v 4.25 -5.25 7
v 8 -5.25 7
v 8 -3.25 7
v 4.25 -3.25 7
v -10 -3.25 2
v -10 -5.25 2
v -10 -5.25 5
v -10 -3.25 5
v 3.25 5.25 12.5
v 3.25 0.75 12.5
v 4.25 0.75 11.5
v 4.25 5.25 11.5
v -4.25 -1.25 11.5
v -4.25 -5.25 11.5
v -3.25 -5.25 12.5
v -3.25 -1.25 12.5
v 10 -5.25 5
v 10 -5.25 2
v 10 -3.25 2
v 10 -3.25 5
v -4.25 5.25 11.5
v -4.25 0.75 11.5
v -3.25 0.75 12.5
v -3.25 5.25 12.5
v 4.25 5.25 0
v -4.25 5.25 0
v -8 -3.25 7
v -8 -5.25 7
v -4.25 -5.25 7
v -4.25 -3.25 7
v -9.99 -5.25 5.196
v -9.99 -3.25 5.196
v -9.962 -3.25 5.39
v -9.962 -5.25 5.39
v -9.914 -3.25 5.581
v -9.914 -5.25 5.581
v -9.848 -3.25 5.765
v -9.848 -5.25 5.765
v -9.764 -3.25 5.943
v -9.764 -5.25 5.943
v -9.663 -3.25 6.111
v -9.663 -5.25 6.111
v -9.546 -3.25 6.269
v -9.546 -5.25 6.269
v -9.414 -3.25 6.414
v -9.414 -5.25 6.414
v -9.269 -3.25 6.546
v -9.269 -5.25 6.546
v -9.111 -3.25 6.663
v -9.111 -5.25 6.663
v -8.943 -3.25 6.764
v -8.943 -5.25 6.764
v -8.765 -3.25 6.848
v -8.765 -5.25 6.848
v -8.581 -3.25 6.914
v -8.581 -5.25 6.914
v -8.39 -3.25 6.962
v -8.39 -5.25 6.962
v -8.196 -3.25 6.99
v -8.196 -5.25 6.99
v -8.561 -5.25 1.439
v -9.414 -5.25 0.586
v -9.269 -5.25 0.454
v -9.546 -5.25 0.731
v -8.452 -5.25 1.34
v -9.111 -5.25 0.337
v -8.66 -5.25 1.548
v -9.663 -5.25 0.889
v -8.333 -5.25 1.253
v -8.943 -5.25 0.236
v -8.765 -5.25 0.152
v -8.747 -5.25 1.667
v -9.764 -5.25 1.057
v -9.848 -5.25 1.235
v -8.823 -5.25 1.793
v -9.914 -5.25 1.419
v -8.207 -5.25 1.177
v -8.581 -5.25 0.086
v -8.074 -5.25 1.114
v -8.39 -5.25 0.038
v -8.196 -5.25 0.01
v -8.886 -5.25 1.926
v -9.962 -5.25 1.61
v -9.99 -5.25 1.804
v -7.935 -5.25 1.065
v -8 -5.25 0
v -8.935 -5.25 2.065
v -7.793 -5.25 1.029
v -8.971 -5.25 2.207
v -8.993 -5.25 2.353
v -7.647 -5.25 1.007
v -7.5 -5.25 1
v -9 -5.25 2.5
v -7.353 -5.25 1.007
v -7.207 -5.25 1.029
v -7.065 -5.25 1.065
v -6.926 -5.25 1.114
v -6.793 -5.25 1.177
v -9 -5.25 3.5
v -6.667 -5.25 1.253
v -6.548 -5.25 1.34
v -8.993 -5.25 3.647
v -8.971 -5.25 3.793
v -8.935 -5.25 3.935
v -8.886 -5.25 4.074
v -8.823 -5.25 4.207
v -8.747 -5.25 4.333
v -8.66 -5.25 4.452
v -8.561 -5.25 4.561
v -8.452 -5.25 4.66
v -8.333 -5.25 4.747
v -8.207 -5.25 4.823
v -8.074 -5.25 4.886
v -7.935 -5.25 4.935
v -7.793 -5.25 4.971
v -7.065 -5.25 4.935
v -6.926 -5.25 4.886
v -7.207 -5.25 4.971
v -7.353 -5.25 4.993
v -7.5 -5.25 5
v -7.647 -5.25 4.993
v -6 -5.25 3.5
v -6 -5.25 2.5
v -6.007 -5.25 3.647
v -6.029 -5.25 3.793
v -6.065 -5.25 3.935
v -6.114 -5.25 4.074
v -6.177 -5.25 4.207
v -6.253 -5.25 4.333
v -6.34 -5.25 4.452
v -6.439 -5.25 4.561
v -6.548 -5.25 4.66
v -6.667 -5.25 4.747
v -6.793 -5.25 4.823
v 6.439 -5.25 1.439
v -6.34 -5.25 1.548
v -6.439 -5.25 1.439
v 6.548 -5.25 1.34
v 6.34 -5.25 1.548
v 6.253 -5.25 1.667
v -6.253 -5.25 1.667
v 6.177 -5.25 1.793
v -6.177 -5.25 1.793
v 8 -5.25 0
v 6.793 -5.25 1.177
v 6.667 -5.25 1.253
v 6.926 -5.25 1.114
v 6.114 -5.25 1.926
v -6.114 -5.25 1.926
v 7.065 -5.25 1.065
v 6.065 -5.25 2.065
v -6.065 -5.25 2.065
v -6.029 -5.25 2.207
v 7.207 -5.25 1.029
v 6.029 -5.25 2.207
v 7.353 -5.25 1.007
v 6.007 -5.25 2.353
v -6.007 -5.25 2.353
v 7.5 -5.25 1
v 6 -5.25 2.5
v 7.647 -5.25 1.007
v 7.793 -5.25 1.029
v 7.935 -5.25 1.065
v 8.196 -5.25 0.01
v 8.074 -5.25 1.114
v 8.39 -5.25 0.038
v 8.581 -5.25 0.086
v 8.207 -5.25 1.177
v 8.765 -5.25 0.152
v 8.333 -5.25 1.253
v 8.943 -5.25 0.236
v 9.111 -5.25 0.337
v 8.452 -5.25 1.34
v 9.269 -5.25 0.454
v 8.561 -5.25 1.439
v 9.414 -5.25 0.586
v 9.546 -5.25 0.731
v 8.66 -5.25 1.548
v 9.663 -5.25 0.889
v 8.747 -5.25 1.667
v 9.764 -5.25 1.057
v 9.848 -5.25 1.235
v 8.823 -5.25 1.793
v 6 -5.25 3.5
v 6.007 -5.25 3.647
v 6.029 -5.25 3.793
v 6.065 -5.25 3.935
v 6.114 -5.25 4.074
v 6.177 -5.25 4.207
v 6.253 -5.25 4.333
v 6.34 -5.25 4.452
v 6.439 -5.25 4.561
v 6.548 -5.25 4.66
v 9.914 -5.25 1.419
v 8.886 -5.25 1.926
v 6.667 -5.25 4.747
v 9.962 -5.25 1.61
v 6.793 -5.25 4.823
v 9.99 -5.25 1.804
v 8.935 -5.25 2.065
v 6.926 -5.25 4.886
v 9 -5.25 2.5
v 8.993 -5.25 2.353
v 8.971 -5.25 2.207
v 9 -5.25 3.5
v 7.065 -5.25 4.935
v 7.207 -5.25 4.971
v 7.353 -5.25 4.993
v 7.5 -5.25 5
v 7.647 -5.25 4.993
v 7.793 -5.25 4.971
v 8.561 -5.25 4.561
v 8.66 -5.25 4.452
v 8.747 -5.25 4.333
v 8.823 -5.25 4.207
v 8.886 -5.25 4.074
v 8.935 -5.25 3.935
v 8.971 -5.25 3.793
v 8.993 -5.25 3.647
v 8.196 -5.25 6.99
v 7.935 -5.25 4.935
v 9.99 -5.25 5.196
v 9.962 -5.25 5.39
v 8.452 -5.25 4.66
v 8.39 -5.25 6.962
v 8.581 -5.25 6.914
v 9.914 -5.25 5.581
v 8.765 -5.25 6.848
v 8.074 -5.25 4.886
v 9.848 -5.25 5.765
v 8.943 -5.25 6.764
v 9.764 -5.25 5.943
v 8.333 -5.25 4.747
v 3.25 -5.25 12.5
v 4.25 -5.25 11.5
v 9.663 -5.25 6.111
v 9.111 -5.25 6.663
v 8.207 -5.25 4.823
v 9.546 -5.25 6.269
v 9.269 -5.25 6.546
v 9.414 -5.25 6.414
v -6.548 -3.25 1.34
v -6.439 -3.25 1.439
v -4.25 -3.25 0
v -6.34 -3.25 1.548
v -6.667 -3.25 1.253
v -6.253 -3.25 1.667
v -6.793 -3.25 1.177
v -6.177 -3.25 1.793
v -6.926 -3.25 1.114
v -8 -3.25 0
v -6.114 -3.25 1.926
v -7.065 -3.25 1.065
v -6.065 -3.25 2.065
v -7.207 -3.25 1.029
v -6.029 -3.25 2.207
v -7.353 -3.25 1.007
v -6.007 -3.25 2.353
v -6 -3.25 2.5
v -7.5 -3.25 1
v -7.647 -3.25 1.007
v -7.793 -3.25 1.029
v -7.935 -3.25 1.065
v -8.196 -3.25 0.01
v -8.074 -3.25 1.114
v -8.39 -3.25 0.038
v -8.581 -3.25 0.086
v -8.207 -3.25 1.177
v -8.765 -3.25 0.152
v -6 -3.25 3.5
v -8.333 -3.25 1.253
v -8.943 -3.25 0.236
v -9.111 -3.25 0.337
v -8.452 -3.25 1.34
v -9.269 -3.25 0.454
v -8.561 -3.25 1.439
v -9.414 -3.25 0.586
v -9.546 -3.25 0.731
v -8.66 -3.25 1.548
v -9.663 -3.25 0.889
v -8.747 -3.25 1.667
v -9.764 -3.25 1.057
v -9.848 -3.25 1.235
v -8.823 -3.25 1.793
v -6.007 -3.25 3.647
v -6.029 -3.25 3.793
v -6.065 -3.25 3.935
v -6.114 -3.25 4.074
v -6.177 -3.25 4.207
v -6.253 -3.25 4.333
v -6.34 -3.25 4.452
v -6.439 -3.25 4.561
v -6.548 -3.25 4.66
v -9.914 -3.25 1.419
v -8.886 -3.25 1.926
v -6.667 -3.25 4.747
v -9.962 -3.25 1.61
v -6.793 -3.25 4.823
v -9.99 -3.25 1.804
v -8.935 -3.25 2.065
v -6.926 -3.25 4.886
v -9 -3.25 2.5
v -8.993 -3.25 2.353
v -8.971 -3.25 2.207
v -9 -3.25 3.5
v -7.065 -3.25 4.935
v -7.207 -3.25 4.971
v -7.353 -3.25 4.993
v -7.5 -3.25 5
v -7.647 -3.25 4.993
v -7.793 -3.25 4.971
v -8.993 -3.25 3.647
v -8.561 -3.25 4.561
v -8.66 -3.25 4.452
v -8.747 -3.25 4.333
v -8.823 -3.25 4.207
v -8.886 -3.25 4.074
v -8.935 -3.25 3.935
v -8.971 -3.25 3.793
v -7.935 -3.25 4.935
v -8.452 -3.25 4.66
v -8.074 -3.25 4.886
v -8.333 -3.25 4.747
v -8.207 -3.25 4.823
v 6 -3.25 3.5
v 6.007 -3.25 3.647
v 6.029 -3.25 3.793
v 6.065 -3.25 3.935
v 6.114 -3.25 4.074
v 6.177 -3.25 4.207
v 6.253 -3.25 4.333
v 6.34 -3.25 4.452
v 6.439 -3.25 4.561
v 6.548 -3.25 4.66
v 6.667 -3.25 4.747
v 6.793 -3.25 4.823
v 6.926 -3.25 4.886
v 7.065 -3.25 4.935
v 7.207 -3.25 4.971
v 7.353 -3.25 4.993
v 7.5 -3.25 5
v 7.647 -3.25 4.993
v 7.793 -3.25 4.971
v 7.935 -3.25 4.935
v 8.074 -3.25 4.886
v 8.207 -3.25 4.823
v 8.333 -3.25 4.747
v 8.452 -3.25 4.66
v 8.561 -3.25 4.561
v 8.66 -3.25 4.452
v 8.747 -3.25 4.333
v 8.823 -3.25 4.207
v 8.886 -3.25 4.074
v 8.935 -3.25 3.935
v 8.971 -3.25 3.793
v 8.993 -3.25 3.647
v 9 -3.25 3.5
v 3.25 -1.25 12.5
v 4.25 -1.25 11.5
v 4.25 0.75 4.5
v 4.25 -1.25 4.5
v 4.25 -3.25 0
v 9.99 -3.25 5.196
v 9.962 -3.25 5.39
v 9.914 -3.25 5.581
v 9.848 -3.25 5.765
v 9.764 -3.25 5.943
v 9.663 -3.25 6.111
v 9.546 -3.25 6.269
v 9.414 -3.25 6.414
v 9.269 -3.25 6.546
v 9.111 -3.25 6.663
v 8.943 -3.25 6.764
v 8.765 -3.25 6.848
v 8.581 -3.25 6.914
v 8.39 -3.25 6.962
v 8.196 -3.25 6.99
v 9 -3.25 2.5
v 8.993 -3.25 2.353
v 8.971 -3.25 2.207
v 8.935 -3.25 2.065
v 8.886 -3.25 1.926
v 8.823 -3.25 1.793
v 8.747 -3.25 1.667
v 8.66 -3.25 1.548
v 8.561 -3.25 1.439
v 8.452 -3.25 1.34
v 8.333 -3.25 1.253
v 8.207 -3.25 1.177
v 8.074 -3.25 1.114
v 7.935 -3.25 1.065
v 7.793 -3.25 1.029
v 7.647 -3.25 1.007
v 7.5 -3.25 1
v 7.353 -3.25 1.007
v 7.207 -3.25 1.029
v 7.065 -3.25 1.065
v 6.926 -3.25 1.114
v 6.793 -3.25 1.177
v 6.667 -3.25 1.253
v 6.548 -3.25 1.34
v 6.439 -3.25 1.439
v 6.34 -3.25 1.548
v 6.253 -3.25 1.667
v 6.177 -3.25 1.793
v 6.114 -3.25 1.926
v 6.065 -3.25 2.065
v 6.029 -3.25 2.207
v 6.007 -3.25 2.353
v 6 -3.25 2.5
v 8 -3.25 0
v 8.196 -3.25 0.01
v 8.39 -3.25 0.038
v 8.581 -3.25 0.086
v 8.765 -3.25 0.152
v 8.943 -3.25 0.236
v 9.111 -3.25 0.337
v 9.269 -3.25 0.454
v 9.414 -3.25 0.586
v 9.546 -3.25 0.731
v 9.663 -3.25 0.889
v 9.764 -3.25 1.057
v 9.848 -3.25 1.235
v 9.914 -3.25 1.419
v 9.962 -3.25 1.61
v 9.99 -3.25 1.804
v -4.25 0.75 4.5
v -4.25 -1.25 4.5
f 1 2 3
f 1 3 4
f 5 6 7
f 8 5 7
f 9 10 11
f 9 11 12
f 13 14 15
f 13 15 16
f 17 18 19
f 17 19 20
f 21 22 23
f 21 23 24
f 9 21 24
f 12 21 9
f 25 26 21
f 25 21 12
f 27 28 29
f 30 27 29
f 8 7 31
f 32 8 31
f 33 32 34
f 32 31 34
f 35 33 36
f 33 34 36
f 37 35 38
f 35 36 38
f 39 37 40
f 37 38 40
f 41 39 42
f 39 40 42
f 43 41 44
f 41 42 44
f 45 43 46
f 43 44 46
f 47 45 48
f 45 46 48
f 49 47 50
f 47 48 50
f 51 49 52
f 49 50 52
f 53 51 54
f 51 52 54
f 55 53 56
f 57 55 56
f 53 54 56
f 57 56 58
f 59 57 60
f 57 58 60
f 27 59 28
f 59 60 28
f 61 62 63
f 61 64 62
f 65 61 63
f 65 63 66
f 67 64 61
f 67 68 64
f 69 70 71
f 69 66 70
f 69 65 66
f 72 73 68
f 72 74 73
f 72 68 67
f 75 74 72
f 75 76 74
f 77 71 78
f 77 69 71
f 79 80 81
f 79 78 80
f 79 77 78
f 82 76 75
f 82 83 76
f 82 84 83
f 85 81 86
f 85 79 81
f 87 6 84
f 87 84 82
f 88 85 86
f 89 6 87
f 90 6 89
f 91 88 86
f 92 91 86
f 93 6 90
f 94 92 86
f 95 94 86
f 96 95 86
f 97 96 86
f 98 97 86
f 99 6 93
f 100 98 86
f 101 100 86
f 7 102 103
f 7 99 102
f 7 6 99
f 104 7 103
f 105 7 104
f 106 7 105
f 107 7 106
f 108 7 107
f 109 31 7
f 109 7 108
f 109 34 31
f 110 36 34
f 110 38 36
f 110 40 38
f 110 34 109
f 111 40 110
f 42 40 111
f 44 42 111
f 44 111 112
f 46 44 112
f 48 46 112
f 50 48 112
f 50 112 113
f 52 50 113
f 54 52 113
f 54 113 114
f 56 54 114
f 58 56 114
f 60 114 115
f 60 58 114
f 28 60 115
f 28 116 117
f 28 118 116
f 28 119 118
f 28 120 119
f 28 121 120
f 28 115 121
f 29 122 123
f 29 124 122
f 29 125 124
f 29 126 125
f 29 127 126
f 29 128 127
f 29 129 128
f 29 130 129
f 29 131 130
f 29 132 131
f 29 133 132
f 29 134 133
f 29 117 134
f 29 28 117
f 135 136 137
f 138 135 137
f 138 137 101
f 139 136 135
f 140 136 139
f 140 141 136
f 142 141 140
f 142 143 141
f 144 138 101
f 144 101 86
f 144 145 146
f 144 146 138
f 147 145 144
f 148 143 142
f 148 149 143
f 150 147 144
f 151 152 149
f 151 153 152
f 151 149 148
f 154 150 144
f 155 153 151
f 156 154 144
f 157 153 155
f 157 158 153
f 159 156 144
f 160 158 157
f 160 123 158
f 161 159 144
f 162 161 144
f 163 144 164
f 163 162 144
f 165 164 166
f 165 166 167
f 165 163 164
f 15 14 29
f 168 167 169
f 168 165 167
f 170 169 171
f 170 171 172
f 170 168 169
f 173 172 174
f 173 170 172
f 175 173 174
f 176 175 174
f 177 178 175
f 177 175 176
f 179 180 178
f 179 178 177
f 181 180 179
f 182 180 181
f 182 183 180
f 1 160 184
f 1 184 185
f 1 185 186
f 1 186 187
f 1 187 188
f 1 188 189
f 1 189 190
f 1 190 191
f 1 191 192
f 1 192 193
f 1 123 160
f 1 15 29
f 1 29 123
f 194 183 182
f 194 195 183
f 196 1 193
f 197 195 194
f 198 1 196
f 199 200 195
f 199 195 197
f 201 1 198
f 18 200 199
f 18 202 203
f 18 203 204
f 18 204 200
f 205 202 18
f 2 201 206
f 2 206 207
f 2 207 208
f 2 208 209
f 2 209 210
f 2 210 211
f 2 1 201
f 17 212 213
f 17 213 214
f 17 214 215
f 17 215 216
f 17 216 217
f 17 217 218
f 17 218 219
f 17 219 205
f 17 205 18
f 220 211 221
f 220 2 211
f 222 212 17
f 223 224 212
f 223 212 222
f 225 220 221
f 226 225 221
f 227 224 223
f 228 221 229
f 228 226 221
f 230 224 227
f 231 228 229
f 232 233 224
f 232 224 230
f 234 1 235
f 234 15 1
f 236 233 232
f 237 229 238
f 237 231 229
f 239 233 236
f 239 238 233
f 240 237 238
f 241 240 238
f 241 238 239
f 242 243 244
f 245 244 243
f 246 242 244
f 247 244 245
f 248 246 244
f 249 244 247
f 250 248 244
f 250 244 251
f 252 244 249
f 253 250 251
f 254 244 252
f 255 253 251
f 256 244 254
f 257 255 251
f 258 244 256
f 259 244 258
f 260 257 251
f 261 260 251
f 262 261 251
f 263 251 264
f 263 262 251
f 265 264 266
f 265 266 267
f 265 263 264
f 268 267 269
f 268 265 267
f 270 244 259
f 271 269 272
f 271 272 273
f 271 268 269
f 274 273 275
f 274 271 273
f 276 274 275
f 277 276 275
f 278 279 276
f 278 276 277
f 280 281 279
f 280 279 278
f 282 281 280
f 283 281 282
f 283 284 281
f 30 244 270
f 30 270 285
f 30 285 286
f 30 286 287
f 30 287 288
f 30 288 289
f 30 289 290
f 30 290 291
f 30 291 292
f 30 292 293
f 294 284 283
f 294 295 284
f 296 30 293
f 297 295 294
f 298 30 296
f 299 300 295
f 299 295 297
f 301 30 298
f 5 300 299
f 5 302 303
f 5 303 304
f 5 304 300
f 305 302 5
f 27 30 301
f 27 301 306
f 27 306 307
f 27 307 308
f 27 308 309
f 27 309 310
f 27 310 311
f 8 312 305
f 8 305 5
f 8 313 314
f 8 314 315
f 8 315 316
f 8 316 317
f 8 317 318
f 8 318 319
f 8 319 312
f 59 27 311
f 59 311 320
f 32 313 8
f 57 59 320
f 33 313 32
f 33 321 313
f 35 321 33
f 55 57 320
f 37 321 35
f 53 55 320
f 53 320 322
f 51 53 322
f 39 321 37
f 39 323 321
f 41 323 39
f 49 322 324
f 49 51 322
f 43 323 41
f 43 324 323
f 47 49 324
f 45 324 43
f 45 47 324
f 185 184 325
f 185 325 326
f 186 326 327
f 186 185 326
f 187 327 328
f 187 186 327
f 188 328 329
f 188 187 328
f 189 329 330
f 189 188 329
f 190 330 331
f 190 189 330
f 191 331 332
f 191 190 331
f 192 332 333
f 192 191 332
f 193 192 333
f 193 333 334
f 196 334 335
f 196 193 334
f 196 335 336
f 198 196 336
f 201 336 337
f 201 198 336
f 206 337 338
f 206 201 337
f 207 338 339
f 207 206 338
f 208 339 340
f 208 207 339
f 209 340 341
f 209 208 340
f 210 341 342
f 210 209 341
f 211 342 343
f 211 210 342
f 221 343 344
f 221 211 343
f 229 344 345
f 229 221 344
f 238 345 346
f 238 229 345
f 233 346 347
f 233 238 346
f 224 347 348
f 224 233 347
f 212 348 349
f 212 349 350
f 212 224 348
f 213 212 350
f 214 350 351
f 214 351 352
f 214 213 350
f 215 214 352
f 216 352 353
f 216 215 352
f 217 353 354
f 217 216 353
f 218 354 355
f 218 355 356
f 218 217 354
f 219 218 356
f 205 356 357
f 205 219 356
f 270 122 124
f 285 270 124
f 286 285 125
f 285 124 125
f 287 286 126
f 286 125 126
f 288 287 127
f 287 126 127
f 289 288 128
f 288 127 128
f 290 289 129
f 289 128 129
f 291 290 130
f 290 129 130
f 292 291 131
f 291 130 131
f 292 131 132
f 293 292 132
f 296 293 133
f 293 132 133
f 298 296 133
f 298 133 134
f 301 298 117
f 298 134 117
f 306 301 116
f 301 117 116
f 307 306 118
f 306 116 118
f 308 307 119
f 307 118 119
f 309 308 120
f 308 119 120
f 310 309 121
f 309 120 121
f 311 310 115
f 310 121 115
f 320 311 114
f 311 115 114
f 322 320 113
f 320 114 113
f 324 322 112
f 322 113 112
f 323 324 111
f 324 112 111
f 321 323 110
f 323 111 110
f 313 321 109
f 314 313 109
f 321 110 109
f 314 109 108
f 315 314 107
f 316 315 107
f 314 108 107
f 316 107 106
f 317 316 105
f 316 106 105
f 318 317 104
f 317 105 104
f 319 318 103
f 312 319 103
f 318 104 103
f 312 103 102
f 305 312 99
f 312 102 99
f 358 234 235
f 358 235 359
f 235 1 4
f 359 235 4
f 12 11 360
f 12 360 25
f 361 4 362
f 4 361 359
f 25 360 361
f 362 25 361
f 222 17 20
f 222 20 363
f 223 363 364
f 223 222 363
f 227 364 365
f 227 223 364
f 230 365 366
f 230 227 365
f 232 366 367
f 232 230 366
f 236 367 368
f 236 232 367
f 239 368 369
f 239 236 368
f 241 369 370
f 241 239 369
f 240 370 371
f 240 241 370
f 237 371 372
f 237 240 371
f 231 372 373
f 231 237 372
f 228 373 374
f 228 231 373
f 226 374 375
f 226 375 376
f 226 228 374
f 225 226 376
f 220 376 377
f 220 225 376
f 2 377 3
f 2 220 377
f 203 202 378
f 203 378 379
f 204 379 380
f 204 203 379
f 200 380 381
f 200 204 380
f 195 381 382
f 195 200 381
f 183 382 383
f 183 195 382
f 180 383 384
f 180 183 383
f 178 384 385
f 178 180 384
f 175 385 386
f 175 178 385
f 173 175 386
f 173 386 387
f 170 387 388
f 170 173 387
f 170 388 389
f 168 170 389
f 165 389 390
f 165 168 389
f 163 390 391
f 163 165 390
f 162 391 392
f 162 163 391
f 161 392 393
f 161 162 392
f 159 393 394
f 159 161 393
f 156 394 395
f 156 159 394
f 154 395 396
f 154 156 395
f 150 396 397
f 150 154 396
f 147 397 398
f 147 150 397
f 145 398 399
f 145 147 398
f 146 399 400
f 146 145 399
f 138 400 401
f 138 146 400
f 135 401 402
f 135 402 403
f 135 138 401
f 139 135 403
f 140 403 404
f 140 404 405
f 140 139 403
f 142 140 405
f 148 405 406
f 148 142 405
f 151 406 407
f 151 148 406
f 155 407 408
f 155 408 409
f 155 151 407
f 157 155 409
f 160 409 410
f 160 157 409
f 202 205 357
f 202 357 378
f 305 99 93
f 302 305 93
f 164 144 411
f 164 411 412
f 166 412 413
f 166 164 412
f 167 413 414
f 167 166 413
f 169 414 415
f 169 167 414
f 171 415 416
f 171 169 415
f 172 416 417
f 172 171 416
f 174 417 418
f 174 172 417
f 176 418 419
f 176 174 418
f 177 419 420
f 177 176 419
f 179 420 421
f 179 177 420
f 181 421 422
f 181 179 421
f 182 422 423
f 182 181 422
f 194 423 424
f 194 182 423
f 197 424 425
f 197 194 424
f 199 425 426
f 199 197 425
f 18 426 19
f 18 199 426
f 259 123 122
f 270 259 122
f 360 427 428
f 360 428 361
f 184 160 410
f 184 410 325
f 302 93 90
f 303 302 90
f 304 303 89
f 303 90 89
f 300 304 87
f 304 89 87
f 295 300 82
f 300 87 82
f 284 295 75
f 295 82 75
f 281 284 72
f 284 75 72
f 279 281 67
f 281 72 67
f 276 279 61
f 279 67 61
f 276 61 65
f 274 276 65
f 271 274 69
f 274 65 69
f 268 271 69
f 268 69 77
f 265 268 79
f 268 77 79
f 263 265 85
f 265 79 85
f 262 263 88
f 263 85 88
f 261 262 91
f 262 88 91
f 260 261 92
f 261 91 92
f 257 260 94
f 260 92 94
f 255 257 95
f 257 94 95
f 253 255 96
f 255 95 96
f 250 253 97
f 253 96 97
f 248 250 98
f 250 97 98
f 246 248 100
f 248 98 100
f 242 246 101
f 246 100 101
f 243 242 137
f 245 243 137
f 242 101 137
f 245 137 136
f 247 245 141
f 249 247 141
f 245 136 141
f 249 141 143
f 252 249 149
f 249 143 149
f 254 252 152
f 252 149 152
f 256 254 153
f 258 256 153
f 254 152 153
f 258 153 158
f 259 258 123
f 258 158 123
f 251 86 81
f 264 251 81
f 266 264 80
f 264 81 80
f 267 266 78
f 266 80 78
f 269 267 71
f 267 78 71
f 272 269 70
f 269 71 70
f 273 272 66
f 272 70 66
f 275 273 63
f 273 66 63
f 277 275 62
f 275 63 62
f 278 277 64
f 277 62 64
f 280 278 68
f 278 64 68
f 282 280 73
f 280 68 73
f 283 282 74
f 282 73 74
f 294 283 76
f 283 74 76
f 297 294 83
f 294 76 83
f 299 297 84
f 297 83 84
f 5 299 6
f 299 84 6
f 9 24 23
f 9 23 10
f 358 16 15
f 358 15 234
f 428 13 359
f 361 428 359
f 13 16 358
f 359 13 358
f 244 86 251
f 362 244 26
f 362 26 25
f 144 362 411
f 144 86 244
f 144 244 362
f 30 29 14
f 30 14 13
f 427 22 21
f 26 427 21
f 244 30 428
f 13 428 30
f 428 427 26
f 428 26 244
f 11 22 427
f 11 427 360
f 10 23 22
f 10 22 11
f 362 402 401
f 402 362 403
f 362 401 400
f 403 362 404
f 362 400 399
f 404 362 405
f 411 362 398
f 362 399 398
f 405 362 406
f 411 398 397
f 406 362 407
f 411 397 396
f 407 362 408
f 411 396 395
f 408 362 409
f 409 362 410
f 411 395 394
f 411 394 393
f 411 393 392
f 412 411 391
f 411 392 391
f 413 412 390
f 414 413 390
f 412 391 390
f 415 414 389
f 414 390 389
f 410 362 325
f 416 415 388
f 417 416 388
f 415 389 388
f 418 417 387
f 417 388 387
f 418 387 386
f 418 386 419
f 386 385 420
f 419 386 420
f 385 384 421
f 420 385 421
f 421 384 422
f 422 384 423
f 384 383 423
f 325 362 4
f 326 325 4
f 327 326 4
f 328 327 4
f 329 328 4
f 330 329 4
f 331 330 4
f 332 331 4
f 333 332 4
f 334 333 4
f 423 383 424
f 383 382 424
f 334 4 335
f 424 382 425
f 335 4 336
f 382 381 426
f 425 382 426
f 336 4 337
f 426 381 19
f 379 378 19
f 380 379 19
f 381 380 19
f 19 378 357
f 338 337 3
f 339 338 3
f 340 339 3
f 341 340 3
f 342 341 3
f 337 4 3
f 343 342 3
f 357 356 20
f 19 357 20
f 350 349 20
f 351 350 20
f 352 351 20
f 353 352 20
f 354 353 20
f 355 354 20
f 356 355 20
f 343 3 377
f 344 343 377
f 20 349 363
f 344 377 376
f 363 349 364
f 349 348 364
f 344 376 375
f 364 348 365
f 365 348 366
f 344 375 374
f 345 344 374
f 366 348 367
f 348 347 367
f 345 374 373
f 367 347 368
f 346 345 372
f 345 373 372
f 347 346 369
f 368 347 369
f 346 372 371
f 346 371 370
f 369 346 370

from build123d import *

# Parameters (mm, degrees)
SKETCH1_W           = 8.5
SKETCH1_H           = 10.5
BOSS_EXTRUDE1_DEPTH = 12.5
SKETCH2_W           = 8.5
SKETCH2_H           = 2
CUT_EXTRUDE1_DEPTH  = 8
BOSS_EXTRUDE2_DEPTH = 2
CHAMFER1_SIZE       = 1


with BuildPart() as part:
    # Sketch1 → Boss-Extrude1 (new body)
    with BuildSketch(Plane.XY):
        Rectangle(SKETCH1_W, SKETCH1_H)
    extrude(amount=BOSS_EXTRUDE1_DEPTH)

    # Sketch2 → Cut-Extrude1 (cut)
    with BuildSketch(Plane.XY.offset(12.5)):
        with Locations((0, -0.25)):
            Rectangle(SKETCH2_W, SKETCH2_H)
    extrude(amount=-CUT_EXTRUDE1_DEPTH, mode=Mode.SUBTRACT)

    # Sketch3 → Boss-Extrude2 (add)
    # profile 1 of 2: a face of its own
    with BuildSketch(Plane.XZ.offset(5.25)):
        with BuildLine():
            Line((4.25, 0), (8, 0))
            ThreePointArc((8, 0), (9.414213562, 0.585786438), (10, 2))
            Line((10, 2), (10, 5))
            ThreePointArc((10, 5), (9.414213562, 6.414213562), (8, 7))
            Line((8, 7), (4.25, 7))
            Line((4.25, 7), (4.25, 0))
        make_face()
        with BuildLine():
            Line((6, 2.5), (6, 3.5))
            ThreePointArc((6, 3.5), (7.5, 5), (9, 3.5))
            Line((9, 3.5), (9, 2.5))
            ThreePointArc((9, 2.5), (7.5, 1), (6, 2.5))
        make_face(mode=Mode.SUBTRACT)
    # profile 2 of 2: a face of its own
    with BuildSketch(Plane.XZ.offset(5.25)):
        with BuildLine():
            Line((-10, 2), (-10, 5))
            ThreePointArc((-10, 5), (-9.414213562, 6.414213562), (-8, 7))
            Line((-8, 7), (-4.25, 7))
            Line((-4.25, 7), (-4.25, 0))
            Line((-4.25, 0), (-8, 0))
            ThreePointArc((-8, 0), (-9.414213562, 0.585786438), (-10, 2))
        make_face()
        with BuildLine():
            Line((-6, 2.5), (-6, 3.5))
            ThreePointArc((-6, 3.5), (-7.5, 5), (-9, 3.5))
            Line((-9, 3.5), (-9, 2.5))
            ThreePointArc((-9, 2.5), (-7.5, 1), (-6, 2.5))
        make_face(mode=Mode.SUBTRACT)
    extrude(amount=-BOSS_EXTRUDE2_DEPTH)

    # Chamfer1
    chamfer1_edges = [part.edges().sort_by_distance(p)[0] for p in [
        (-4.25, 3, 12.5),
        (4.25, 3, 12.5),
        (-4.25, -3.25, 12.5),
        (4.25, -3.25, 12.5),
    ]]
    chamfer(chamfer1_edges, length=CHAMFER1_SIZE)


solid = part.part
